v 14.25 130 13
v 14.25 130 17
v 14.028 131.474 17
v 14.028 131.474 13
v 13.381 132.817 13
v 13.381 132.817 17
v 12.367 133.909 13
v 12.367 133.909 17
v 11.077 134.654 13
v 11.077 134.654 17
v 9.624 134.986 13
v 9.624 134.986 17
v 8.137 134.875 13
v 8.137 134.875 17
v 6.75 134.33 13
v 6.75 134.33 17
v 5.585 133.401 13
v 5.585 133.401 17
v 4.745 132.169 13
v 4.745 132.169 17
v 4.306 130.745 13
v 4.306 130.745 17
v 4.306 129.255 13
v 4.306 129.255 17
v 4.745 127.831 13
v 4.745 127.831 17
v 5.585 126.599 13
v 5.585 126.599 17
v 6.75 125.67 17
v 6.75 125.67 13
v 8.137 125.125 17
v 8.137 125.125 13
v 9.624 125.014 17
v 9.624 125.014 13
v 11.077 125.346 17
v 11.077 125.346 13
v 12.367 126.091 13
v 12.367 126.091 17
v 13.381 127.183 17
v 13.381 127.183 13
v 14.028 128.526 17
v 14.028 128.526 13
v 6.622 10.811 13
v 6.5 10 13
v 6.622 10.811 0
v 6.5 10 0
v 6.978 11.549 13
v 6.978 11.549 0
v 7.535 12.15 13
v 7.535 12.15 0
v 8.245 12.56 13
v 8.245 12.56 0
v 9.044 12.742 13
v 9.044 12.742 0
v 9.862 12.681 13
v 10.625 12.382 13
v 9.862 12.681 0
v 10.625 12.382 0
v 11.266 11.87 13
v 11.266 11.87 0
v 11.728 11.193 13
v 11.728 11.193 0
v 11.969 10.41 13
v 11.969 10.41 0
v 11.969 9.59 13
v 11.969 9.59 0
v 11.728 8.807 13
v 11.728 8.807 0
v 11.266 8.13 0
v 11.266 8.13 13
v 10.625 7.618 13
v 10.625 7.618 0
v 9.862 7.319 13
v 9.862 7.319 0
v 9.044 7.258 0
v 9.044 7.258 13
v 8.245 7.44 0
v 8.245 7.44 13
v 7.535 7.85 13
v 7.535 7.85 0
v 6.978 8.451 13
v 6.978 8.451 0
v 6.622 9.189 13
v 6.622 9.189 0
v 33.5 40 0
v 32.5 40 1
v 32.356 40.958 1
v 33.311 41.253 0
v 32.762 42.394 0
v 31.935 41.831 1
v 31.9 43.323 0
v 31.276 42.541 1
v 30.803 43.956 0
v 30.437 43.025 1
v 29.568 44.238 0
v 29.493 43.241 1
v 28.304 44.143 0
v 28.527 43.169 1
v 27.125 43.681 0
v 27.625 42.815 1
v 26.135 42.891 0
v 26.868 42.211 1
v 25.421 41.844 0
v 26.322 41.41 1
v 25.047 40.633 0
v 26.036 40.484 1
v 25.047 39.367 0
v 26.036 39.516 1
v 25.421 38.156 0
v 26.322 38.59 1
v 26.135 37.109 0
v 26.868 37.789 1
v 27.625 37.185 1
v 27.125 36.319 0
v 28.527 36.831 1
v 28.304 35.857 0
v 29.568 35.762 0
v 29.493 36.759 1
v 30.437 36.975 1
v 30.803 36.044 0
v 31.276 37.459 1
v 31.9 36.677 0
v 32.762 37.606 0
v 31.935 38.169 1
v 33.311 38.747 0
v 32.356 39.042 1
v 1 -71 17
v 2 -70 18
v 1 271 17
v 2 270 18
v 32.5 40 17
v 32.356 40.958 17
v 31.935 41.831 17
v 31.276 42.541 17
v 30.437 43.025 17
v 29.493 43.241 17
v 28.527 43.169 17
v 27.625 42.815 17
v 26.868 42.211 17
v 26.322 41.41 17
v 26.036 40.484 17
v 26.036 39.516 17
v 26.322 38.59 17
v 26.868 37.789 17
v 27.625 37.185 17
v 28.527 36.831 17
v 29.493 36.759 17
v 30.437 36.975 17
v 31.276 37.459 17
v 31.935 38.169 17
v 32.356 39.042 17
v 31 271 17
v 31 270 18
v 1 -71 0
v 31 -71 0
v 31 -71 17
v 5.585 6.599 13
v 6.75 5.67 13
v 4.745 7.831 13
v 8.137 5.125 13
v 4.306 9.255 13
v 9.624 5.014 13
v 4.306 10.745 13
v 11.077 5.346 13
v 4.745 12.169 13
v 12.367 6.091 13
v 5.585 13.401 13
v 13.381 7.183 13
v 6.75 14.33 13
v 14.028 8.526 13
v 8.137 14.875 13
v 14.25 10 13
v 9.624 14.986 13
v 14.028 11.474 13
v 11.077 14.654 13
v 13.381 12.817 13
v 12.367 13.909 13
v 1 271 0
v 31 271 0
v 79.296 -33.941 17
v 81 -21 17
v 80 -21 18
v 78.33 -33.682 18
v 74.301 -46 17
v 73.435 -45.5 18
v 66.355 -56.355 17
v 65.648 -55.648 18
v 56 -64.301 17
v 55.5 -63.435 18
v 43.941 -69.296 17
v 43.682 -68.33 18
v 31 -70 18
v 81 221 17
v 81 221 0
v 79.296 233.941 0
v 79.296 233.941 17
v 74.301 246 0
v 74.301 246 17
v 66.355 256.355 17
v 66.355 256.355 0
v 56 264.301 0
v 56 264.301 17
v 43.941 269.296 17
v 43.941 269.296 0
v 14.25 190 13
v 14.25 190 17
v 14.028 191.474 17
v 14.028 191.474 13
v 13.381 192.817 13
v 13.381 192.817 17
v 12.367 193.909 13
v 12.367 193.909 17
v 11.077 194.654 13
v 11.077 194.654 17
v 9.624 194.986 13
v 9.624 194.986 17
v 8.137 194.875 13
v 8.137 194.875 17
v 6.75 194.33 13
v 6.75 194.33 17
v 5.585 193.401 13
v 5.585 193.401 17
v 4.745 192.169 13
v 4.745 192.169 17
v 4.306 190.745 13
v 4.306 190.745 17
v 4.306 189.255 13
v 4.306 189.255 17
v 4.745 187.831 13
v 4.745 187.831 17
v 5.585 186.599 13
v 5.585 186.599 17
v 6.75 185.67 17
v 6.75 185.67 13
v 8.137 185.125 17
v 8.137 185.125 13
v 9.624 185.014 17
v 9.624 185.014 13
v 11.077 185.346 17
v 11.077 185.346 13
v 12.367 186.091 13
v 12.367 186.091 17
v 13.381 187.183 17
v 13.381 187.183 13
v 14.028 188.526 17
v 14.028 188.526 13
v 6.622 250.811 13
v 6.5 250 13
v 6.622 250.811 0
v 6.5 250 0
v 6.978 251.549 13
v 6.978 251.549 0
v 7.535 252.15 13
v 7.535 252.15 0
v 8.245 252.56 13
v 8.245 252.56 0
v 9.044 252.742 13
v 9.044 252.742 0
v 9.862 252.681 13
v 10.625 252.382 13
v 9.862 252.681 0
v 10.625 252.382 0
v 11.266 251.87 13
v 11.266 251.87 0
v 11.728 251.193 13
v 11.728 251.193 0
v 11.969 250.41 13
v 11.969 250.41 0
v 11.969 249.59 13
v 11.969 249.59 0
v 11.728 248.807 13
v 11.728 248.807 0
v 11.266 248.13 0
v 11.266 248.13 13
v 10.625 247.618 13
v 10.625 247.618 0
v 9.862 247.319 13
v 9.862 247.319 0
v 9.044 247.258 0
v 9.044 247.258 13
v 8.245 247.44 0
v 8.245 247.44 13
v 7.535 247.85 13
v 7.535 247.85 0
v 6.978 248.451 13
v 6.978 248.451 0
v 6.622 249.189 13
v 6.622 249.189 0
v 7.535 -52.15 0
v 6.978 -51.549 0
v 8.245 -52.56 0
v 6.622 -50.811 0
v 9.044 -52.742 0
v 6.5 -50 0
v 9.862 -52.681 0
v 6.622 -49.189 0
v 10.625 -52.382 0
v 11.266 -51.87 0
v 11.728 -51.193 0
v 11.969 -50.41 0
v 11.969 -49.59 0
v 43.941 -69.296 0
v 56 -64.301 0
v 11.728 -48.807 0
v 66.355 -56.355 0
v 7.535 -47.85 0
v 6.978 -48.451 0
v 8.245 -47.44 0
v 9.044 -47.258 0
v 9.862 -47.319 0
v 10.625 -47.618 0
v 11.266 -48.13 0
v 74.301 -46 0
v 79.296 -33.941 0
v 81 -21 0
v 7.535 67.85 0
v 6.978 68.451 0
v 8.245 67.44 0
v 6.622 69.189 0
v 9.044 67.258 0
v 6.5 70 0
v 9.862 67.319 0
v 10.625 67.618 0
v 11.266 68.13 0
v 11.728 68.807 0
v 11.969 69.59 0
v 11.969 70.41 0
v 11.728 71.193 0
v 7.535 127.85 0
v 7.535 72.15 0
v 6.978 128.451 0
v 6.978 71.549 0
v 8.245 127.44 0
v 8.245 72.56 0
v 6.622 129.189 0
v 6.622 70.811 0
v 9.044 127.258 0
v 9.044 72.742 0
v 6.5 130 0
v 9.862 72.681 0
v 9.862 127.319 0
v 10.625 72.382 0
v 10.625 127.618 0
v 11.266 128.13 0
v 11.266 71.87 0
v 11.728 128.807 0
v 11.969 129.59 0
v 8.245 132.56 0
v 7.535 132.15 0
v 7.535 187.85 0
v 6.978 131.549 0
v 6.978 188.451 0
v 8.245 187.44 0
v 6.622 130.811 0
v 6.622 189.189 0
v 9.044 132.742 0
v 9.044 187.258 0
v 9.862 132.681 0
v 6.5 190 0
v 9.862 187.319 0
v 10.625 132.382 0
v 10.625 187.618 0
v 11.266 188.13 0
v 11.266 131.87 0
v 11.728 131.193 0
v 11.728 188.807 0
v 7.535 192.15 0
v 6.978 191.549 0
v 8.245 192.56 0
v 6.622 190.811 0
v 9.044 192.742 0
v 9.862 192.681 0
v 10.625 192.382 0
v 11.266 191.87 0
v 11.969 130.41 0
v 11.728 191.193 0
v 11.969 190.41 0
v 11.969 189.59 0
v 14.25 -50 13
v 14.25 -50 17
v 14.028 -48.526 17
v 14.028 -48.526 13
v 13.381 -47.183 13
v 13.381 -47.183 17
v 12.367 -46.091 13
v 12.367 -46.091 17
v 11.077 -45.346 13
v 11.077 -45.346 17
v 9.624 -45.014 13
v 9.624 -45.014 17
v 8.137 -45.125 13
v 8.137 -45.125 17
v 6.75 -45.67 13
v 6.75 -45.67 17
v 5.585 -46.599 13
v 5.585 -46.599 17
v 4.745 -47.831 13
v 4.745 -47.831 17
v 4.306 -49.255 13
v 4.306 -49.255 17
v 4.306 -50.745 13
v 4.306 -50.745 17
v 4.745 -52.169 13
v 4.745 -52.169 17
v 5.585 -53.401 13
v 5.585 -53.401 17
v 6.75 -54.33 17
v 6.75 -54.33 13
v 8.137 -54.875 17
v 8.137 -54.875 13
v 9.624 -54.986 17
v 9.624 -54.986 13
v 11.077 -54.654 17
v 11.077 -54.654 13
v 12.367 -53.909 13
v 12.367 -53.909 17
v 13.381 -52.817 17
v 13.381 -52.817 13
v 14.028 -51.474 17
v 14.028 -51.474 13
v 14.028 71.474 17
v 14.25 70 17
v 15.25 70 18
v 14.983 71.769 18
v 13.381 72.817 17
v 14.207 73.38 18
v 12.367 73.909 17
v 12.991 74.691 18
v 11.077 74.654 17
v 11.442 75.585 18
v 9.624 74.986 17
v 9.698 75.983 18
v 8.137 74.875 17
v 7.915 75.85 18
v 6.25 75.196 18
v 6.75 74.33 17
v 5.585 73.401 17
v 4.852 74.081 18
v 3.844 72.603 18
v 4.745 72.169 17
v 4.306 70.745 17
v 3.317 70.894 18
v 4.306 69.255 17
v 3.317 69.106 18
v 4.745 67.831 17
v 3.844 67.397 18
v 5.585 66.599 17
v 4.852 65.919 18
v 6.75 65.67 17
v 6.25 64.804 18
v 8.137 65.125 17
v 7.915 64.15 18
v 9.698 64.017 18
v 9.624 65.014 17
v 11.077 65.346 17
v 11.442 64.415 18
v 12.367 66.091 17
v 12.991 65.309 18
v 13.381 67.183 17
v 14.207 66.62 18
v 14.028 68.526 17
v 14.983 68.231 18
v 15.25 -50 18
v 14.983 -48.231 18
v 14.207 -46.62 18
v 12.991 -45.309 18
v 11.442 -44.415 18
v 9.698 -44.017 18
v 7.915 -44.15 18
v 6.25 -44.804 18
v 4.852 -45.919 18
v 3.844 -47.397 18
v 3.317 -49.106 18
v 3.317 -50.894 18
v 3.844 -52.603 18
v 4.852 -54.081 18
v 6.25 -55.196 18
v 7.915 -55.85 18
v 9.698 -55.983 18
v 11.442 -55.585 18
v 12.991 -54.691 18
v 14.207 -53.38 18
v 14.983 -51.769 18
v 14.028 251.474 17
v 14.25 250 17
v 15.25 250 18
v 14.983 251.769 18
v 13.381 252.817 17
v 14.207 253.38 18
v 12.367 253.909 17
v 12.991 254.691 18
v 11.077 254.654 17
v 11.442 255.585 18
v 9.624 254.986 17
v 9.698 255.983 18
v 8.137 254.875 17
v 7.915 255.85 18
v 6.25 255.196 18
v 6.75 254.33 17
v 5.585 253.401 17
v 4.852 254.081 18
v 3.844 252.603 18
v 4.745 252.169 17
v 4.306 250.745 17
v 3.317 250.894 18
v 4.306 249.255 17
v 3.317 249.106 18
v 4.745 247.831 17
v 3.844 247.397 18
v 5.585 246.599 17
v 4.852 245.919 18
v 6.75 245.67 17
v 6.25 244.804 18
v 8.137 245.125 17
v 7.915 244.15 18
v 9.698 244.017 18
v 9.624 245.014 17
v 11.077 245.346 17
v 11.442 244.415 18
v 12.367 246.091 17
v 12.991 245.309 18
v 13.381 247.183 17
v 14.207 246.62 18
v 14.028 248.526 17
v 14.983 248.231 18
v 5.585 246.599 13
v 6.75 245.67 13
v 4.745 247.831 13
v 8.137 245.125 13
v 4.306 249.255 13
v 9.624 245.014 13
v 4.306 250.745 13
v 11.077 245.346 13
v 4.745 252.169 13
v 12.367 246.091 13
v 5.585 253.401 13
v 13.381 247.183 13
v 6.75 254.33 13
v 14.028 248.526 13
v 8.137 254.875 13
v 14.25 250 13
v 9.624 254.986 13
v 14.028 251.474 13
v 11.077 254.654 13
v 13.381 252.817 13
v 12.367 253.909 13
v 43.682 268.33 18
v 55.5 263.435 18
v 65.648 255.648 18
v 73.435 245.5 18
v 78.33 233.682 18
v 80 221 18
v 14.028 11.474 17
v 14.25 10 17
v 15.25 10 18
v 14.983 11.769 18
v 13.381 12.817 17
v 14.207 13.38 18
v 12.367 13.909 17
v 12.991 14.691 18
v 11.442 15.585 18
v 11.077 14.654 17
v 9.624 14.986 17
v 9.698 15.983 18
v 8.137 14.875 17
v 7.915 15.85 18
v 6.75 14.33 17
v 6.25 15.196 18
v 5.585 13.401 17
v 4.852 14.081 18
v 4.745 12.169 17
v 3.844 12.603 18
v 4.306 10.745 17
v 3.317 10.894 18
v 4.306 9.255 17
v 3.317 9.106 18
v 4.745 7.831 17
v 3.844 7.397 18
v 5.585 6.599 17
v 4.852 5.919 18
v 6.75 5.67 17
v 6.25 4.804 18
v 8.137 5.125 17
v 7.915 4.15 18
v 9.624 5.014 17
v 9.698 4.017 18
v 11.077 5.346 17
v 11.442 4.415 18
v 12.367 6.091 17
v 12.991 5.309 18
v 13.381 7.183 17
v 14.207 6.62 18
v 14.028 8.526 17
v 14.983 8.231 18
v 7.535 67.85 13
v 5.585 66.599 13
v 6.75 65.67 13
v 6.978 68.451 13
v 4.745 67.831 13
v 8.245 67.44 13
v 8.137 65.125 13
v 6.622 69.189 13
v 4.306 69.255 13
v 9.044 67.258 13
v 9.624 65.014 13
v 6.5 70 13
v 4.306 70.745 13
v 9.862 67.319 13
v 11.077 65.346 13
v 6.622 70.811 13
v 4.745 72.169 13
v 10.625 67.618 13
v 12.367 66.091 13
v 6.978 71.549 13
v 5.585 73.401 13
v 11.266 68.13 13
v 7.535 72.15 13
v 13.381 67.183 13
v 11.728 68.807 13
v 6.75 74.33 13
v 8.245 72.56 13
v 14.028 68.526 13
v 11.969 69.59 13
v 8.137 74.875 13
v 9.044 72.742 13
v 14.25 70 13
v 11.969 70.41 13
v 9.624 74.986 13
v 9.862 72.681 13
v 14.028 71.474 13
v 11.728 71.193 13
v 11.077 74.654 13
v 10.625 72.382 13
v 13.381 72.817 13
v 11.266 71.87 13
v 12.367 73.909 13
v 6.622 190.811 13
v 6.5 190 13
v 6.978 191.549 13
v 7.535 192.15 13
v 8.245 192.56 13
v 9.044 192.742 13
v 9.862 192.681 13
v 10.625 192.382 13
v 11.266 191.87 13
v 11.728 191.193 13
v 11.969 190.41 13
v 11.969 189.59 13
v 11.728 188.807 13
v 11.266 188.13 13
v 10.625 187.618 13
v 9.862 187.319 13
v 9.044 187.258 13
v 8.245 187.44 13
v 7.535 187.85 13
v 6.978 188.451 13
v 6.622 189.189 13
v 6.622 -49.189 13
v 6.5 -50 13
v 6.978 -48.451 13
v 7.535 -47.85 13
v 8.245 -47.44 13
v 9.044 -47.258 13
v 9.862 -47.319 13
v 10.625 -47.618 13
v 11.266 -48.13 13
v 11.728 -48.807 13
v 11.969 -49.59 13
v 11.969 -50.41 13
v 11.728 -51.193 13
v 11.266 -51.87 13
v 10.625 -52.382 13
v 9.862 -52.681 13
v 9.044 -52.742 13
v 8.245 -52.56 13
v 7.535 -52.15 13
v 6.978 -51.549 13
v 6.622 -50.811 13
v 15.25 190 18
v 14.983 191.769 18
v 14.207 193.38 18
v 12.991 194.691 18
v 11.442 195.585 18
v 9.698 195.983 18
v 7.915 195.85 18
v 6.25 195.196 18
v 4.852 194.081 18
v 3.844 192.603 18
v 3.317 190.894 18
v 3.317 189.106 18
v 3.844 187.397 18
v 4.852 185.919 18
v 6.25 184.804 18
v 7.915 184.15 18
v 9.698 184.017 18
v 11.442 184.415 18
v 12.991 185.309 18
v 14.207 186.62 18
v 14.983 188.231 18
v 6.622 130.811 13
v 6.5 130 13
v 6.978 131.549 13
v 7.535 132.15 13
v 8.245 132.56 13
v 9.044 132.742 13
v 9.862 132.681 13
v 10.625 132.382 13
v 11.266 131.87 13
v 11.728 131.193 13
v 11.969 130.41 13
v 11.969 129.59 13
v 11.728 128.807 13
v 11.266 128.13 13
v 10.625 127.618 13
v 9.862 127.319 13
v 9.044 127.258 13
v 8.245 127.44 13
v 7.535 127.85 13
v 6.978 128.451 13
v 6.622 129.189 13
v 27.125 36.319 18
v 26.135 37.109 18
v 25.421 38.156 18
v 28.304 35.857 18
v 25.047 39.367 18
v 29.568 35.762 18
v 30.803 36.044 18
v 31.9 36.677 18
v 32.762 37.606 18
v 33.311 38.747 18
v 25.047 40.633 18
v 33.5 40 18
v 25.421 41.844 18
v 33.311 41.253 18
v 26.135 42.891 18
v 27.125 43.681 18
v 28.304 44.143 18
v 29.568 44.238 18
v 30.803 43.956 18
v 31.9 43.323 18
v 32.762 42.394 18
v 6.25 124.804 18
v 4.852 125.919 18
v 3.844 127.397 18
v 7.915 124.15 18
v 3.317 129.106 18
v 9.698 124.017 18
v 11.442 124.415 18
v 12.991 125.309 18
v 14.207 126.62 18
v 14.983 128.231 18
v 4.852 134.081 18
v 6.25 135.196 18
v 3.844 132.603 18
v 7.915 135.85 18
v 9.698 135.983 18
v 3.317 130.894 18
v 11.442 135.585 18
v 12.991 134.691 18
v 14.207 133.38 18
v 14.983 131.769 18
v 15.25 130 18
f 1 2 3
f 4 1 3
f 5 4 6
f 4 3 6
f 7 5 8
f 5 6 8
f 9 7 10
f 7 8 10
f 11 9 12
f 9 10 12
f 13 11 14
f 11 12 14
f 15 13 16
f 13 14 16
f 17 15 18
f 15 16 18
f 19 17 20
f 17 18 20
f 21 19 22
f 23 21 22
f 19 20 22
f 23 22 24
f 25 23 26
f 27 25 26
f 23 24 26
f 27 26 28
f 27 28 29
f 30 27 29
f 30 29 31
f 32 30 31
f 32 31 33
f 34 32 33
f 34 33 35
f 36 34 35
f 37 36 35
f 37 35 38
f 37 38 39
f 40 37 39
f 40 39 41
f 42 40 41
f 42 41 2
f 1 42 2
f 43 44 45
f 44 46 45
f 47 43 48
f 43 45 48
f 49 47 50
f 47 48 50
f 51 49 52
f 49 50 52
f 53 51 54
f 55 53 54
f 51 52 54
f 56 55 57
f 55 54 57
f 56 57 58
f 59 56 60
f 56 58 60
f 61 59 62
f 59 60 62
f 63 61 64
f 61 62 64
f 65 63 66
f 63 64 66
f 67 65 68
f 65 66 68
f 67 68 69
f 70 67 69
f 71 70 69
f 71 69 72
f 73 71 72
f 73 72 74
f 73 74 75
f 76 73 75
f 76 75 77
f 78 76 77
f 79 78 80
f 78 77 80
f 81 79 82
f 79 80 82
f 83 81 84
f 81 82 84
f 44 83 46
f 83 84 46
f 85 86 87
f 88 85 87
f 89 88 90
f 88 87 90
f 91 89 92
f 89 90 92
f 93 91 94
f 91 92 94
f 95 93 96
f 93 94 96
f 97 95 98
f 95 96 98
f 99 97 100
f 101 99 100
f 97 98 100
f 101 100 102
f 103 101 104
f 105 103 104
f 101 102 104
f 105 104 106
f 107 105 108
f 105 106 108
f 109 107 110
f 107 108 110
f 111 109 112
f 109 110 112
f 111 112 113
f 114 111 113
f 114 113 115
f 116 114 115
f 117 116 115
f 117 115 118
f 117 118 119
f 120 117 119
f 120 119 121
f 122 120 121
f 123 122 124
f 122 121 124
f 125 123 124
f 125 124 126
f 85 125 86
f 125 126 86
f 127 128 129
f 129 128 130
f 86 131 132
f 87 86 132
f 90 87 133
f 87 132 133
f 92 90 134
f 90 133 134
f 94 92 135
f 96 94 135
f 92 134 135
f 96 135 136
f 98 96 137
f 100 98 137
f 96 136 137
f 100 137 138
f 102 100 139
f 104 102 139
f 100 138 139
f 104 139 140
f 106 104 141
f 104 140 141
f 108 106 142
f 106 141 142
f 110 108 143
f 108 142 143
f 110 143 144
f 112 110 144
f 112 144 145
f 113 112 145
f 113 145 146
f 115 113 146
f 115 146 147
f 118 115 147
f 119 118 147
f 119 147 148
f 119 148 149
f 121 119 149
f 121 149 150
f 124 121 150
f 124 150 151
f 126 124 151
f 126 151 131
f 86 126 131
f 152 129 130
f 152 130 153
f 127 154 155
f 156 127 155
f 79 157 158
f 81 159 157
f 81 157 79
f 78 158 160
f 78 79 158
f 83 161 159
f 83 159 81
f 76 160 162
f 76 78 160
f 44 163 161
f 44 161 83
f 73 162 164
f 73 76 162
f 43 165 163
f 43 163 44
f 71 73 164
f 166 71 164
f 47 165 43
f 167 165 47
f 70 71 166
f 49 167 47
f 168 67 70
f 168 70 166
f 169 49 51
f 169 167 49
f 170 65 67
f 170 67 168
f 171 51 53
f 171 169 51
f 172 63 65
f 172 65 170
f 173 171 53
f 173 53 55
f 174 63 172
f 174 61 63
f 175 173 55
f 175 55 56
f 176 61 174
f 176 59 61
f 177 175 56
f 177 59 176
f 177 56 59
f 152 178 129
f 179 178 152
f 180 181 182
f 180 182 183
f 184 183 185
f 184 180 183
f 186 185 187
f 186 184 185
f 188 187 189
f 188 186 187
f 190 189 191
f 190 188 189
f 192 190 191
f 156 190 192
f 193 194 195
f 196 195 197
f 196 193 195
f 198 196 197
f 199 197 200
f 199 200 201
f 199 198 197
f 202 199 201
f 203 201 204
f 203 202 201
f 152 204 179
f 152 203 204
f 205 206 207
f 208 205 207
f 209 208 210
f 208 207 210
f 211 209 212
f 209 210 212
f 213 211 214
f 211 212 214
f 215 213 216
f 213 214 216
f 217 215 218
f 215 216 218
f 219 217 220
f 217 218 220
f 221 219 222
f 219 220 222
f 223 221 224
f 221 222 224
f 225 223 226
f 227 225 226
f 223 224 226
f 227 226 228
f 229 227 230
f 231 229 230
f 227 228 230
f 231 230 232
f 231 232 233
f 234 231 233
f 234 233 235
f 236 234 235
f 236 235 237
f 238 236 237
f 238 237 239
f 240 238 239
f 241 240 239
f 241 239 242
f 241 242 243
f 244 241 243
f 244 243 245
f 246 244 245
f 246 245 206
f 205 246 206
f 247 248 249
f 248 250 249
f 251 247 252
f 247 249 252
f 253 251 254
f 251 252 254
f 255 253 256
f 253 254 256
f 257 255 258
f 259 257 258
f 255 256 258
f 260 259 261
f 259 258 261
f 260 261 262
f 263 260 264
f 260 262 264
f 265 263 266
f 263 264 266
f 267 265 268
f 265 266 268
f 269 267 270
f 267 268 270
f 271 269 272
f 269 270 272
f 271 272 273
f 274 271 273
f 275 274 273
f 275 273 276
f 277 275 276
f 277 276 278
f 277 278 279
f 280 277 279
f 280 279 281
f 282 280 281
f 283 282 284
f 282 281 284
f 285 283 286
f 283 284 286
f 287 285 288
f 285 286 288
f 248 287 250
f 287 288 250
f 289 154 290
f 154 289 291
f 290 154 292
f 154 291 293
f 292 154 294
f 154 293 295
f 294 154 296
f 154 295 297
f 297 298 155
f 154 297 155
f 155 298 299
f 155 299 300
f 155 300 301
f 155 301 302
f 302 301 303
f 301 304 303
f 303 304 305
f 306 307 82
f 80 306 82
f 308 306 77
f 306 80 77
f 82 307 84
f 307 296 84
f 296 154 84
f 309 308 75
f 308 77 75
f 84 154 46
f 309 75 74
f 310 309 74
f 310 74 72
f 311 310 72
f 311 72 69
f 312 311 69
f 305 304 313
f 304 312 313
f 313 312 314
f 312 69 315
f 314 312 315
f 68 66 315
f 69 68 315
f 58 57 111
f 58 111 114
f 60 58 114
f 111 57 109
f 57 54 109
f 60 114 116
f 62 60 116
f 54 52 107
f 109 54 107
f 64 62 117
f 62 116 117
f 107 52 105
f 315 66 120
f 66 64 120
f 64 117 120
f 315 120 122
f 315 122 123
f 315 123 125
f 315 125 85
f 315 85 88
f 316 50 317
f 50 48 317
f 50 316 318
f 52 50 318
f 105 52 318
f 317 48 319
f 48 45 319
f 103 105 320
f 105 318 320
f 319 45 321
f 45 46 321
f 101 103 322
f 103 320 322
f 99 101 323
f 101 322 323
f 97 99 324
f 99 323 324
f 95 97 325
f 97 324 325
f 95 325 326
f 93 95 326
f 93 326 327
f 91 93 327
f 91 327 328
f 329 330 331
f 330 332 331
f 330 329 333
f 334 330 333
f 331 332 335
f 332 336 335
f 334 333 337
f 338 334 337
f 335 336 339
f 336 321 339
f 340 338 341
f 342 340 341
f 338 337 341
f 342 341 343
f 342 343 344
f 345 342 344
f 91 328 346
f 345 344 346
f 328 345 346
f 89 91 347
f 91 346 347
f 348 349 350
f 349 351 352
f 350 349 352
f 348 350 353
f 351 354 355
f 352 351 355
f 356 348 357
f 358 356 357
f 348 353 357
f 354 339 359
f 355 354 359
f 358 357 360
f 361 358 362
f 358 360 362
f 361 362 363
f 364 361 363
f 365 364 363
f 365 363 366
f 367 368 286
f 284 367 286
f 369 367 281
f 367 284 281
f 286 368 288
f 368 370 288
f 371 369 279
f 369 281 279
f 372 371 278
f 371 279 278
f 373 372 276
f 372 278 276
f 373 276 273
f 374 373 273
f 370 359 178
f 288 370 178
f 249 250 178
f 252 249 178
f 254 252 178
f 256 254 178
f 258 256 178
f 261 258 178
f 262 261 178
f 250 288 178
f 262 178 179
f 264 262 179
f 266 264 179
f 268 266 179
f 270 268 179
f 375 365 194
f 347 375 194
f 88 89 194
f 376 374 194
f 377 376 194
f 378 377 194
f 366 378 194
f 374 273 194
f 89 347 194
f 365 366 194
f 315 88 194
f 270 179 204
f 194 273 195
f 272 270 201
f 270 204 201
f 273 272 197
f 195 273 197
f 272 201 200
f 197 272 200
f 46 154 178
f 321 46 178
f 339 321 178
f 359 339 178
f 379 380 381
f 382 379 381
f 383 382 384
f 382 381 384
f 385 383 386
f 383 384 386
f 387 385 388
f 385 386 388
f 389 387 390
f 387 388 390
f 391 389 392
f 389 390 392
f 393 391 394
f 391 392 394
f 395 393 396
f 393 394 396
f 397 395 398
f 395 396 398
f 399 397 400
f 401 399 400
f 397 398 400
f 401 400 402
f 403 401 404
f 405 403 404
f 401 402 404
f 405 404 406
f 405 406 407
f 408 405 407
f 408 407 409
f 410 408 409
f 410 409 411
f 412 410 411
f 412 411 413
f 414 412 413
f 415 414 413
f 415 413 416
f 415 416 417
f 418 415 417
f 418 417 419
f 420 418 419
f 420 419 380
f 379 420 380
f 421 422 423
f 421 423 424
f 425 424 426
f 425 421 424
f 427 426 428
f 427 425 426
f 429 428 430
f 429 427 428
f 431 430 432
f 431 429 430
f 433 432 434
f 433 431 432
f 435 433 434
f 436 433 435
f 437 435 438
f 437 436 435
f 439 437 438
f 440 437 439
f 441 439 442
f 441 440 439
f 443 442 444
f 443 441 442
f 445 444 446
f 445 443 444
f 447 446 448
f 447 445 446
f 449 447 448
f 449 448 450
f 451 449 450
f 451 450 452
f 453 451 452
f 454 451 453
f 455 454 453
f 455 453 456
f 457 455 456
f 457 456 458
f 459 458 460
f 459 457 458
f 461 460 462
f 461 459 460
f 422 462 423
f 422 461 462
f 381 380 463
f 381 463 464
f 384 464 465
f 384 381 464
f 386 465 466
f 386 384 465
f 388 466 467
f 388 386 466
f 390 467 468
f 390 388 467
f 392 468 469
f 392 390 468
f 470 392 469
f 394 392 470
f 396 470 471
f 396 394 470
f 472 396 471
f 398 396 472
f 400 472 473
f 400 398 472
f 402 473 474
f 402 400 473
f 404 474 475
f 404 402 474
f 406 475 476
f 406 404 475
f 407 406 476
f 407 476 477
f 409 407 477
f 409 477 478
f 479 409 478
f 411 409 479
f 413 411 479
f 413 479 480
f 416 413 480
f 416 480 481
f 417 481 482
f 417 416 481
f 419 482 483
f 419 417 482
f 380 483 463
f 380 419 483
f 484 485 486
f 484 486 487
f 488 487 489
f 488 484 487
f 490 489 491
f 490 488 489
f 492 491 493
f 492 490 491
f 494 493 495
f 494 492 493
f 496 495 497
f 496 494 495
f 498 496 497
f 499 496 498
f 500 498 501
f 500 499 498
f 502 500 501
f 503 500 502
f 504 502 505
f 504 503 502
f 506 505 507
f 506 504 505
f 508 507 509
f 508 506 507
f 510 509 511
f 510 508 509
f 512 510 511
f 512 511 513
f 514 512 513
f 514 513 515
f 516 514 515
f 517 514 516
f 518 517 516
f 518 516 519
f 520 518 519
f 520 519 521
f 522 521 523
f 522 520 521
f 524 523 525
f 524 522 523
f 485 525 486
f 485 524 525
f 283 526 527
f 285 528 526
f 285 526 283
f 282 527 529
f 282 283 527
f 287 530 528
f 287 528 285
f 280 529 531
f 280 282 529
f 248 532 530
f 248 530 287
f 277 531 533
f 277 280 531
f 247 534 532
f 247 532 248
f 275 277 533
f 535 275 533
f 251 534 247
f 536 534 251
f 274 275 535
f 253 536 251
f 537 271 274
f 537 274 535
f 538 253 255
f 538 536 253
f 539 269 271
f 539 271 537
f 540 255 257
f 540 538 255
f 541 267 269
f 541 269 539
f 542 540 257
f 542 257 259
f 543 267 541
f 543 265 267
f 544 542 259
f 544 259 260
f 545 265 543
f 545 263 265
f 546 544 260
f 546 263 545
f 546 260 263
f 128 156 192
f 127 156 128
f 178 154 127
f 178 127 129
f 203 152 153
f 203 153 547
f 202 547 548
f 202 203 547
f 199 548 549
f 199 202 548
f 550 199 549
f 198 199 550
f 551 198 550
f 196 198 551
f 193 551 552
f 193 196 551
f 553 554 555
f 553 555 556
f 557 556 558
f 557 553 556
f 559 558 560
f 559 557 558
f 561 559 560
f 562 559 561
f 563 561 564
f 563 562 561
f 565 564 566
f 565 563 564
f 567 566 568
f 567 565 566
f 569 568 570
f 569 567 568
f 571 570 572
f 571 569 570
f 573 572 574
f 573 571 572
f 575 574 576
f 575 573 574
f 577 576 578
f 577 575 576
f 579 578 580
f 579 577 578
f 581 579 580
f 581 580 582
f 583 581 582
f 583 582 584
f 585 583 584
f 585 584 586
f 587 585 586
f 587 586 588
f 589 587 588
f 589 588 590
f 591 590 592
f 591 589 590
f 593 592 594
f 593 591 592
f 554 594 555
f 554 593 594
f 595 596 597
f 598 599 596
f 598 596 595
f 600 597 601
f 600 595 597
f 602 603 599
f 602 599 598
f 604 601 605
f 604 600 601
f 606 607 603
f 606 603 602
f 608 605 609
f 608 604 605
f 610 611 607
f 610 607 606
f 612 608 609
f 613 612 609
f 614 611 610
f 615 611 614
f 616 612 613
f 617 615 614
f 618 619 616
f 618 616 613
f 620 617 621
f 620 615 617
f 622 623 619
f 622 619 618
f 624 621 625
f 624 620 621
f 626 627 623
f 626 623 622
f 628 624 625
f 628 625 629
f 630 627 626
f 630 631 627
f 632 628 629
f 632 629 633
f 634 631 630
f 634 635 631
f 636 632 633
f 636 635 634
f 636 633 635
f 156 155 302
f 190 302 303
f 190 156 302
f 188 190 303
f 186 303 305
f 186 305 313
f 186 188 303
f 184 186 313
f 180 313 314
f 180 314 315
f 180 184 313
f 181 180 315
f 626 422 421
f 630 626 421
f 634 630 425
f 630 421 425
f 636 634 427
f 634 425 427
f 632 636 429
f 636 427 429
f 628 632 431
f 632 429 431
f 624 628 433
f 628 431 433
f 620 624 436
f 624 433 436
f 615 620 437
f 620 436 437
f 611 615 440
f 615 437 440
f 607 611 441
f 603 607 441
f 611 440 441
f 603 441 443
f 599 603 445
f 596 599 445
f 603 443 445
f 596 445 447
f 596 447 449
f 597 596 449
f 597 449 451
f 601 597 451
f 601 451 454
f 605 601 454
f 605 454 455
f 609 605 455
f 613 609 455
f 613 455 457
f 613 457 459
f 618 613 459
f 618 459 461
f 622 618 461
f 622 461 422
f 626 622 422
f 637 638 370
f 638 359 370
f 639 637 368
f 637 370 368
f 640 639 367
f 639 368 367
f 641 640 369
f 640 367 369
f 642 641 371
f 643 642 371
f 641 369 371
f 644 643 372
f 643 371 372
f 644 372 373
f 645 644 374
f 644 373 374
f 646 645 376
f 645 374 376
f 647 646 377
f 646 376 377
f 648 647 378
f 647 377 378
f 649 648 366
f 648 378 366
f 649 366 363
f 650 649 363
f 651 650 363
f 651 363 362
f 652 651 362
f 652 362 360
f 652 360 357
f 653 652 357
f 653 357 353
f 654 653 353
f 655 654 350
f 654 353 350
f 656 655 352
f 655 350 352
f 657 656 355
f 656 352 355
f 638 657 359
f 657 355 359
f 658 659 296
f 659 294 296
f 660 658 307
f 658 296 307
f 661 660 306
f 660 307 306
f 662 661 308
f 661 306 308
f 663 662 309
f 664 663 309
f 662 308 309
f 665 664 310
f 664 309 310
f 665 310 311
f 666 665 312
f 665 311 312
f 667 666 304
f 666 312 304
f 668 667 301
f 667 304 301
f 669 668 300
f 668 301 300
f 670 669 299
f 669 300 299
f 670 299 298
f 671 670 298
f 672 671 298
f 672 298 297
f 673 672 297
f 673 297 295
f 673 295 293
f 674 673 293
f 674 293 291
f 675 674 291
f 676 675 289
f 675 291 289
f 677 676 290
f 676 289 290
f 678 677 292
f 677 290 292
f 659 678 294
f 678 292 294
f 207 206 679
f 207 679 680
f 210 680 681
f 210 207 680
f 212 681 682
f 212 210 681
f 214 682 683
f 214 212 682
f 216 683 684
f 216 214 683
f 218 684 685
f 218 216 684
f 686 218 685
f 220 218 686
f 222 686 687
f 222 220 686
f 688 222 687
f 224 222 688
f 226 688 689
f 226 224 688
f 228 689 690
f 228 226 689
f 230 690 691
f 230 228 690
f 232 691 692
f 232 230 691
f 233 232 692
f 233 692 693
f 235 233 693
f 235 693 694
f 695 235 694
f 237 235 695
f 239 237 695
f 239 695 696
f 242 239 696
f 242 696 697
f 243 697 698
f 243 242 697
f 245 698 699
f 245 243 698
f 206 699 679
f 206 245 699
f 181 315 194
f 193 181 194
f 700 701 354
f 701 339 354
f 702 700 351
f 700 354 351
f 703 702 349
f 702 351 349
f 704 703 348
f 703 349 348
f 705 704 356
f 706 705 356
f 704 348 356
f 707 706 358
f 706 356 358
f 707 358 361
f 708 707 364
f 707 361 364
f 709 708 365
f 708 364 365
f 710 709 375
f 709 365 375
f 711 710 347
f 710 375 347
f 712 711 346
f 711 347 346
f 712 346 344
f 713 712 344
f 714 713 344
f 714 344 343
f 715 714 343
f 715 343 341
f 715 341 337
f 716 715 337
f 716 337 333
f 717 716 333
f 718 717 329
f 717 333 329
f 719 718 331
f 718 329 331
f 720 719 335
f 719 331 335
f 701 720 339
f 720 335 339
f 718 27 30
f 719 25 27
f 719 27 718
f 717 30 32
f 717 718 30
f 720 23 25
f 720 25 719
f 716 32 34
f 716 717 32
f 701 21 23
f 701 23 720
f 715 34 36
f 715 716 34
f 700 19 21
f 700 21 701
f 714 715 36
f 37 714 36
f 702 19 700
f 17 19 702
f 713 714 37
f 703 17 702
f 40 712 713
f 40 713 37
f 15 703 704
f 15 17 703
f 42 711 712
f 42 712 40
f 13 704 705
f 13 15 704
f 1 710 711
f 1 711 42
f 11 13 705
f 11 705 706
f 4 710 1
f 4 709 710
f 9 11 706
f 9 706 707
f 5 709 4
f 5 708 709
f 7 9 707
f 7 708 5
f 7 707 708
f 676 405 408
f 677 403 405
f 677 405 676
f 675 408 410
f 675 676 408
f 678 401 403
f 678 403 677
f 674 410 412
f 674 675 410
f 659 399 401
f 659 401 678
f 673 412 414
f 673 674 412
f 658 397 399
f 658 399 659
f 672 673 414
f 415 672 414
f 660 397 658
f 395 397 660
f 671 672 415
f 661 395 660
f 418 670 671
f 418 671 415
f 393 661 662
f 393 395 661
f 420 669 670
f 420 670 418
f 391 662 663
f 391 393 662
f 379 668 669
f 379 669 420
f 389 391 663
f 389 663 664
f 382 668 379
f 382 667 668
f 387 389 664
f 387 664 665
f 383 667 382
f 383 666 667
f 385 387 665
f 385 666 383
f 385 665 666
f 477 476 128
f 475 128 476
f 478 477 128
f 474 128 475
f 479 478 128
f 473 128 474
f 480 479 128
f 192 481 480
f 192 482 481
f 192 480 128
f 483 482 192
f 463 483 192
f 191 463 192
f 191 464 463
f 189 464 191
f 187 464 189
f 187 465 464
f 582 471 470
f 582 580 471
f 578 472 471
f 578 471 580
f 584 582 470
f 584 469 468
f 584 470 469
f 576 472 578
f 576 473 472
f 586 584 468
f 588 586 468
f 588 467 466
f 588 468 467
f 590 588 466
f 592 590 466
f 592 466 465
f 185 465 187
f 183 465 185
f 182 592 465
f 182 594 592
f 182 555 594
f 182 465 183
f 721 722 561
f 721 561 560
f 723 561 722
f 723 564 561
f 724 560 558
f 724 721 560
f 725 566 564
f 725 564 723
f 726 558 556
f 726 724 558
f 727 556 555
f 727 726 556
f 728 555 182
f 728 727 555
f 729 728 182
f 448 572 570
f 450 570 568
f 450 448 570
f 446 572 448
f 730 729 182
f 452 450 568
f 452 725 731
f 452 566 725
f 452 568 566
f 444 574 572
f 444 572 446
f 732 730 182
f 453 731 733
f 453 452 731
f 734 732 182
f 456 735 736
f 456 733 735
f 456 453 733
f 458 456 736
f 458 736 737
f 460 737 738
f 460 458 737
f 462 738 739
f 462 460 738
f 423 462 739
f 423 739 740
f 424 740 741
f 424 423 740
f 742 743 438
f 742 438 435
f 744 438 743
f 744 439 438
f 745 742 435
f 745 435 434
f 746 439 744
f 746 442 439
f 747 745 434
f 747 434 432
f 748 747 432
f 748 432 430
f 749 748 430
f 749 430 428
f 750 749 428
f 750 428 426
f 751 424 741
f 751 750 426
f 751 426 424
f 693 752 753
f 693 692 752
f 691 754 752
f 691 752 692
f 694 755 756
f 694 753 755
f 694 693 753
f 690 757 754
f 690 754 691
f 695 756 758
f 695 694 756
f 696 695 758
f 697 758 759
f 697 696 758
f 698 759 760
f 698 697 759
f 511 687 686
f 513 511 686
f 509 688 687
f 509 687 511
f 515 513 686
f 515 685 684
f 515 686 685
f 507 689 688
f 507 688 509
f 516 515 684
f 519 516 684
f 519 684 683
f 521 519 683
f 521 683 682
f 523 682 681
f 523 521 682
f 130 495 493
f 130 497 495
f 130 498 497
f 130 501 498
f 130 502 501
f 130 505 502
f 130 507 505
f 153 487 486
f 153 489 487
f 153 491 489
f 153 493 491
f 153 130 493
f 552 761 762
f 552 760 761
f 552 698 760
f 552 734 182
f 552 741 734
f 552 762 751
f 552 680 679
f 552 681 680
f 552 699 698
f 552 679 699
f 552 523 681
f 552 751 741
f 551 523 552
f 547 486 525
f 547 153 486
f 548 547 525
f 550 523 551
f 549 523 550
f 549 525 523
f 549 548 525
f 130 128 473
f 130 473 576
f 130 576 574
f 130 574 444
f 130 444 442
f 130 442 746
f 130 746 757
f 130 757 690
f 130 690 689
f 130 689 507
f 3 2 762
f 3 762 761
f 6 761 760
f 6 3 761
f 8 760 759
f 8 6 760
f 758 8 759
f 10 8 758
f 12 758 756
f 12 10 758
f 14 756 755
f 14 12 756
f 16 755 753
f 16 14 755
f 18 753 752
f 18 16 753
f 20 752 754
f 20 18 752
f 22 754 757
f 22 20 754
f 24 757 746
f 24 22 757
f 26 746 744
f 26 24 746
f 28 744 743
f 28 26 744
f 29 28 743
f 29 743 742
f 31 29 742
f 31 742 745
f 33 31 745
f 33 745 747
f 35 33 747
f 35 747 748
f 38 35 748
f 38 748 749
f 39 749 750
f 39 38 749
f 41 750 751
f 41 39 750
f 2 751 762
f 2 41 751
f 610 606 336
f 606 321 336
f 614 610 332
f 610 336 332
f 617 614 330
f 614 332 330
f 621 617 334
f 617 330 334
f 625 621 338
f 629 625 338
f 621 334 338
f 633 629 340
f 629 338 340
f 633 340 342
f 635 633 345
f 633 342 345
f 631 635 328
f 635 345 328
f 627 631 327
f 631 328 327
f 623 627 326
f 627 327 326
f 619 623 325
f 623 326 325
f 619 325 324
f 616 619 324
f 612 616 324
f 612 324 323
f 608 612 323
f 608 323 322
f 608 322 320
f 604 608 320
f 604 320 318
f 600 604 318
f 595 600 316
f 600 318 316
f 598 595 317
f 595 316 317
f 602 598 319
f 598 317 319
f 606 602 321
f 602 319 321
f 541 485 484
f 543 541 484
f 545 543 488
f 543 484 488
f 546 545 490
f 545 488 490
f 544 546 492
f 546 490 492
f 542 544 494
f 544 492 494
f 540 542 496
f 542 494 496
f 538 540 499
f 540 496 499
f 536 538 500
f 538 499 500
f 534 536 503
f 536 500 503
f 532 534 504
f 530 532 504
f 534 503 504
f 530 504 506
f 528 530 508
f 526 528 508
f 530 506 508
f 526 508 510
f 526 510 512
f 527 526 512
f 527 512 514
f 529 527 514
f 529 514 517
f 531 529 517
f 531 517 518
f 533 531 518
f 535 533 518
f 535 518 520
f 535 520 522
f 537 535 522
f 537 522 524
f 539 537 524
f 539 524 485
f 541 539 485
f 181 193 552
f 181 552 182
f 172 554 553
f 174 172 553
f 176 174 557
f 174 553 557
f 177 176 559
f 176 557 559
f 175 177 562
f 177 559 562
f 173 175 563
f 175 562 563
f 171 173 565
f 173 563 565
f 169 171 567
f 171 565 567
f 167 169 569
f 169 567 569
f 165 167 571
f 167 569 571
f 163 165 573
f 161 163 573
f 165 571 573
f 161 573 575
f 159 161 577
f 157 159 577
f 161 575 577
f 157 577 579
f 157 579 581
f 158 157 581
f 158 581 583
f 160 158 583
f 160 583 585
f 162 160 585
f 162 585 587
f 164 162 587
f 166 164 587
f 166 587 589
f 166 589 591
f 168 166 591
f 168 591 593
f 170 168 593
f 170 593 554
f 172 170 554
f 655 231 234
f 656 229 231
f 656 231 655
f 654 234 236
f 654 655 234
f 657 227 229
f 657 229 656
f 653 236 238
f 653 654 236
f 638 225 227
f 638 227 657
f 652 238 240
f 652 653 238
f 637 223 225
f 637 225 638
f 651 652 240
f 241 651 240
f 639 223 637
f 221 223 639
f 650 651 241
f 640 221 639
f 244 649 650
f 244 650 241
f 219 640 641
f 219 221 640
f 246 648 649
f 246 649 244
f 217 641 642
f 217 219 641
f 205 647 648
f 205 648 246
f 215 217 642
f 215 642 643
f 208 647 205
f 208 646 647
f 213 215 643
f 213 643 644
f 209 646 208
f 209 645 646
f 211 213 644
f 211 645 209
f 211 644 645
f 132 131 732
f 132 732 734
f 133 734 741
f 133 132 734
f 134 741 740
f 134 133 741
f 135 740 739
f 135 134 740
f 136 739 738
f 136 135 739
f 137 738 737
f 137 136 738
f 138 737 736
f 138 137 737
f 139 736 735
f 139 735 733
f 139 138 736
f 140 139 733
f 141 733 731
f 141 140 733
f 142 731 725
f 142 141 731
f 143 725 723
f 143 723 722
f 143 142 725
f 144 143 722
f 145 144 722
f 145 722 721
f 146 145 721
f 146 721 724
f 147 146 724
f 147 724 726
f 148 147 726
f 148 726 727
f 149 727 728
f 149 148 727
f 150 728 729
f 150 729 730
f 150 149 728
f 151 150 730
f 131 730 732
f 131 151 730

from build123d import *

# Parameters (mm, degrees)
SKETCH1_W                      = 80
SKETCH1_H                      = 342
BOSS_EXTRUDE1_DEPTH            = 18
FILLET1_R                      = 50
CBORE_FOR_M5_SHCS1_D           = 5.5
CBORE_FOR_M5_SHCS1_DEPTH       = 28.347633298
CBORE_FOR_M5_SHCS1_CBORE_D     = 10
CBORE_FOR_M5_SHCS1_CBORE_DEPTH = 5
CBORE_FOR_M5_SHCS1_TIP         = 1.652366702
CHAMFER1_SIZE                  = 1
SKETCH5_R                      = 3.25
CUT_EXTRUDE1_DEPTH             = 284.418418597
CHAMFER2_SIZE                  = 1


with BuildPart() as part:
    # Sketch1 → Boss-Extrude1 (new body)
    with BuildSketch(Plane.XY):
        with Locations((41, 100)):
            Rectangle(SKETCH1_W, SKETCH1_H)
    extrude(amount=BOSS_EXTRUDE1_DEPTH)

    # Fillet1
    fillet1_edges = [part.edges().sort_by_distance(p)[0] for p in [
        (81, 271, 9),
        (81, -71, 9),
    ]]
    fillet(fillet1_edges, radius=FILLET1_R)

    # CBORE for M5 SHCS1
    with Locations(Plane.XY.offset(18)):
        with Locations((9.25, 250), (9.25, 190), (9.25, 130), (9.25, 70), (9.25, 10), (9.25, -50)):
            CounterBoreHole(CBORE_FOR_M5_SHCS1_D / 2, CBORE_FOR_M5_SHCS1_CBORE_D / 2, CBORE_FOR_M5_SHCS1_CBORE_DEPTH, depth=CBORE_FOR_M5_SHCS1_DEPTH)
            with Locations((0, 0, -(CBORE_FOR_M5_SHCS1_DEPTH + CBORE_FOR_M5_SHCS1_TIP / 2))):  # 118° drill point
                Cone(0, CBORE_FOR_M5_SHCS1_D / 2, CBORE_FOR_M5_SHCS1_TIP, mode=Mode.SUBTRACT)

    # Chamfer1
    chamfer1_edges = [part.edges().sort_by_distance(p)[0] for p in [
        (16, 271, 18),
        (81, 100, 18),
        (66.355339059, -56.355339059, 18),
        (66.355339059, 256.355339059, 18),
        (4.25, -50, 18),
        (4.25, 10, 18),
        (4.25, 70, 18),
        (1, 100, 18),
        (4.25, 130, 18),
        (4.25, 190, 18),
        (4.25, 250, 18),
        (16, -71, 18),
    ]]
    chamfer(chamfer1_edges, length=CHAMFER1_SIZE)

    # Sketch5 → Cut-Extrude1 (cut, through all)
    with BuildSketch(Plane.XY.offset(18)):
        with Locations((29.25, 40)):
            Circle(SKETCH5_R)
    extrude(amount=-CUT_EXTRUDE1_DEPTH, mode=Mode.SUBTRACT)

    # Chamfer2
    chamfer2_edges = [part.edges().sort_by_distance(p)[0] for p in [
        (26, 40, 0),
        (26, 40, 18),
    ]]
    chamfer(chamfer2_edges, length=CHAMFER2_SIZE)


solid = part.part
